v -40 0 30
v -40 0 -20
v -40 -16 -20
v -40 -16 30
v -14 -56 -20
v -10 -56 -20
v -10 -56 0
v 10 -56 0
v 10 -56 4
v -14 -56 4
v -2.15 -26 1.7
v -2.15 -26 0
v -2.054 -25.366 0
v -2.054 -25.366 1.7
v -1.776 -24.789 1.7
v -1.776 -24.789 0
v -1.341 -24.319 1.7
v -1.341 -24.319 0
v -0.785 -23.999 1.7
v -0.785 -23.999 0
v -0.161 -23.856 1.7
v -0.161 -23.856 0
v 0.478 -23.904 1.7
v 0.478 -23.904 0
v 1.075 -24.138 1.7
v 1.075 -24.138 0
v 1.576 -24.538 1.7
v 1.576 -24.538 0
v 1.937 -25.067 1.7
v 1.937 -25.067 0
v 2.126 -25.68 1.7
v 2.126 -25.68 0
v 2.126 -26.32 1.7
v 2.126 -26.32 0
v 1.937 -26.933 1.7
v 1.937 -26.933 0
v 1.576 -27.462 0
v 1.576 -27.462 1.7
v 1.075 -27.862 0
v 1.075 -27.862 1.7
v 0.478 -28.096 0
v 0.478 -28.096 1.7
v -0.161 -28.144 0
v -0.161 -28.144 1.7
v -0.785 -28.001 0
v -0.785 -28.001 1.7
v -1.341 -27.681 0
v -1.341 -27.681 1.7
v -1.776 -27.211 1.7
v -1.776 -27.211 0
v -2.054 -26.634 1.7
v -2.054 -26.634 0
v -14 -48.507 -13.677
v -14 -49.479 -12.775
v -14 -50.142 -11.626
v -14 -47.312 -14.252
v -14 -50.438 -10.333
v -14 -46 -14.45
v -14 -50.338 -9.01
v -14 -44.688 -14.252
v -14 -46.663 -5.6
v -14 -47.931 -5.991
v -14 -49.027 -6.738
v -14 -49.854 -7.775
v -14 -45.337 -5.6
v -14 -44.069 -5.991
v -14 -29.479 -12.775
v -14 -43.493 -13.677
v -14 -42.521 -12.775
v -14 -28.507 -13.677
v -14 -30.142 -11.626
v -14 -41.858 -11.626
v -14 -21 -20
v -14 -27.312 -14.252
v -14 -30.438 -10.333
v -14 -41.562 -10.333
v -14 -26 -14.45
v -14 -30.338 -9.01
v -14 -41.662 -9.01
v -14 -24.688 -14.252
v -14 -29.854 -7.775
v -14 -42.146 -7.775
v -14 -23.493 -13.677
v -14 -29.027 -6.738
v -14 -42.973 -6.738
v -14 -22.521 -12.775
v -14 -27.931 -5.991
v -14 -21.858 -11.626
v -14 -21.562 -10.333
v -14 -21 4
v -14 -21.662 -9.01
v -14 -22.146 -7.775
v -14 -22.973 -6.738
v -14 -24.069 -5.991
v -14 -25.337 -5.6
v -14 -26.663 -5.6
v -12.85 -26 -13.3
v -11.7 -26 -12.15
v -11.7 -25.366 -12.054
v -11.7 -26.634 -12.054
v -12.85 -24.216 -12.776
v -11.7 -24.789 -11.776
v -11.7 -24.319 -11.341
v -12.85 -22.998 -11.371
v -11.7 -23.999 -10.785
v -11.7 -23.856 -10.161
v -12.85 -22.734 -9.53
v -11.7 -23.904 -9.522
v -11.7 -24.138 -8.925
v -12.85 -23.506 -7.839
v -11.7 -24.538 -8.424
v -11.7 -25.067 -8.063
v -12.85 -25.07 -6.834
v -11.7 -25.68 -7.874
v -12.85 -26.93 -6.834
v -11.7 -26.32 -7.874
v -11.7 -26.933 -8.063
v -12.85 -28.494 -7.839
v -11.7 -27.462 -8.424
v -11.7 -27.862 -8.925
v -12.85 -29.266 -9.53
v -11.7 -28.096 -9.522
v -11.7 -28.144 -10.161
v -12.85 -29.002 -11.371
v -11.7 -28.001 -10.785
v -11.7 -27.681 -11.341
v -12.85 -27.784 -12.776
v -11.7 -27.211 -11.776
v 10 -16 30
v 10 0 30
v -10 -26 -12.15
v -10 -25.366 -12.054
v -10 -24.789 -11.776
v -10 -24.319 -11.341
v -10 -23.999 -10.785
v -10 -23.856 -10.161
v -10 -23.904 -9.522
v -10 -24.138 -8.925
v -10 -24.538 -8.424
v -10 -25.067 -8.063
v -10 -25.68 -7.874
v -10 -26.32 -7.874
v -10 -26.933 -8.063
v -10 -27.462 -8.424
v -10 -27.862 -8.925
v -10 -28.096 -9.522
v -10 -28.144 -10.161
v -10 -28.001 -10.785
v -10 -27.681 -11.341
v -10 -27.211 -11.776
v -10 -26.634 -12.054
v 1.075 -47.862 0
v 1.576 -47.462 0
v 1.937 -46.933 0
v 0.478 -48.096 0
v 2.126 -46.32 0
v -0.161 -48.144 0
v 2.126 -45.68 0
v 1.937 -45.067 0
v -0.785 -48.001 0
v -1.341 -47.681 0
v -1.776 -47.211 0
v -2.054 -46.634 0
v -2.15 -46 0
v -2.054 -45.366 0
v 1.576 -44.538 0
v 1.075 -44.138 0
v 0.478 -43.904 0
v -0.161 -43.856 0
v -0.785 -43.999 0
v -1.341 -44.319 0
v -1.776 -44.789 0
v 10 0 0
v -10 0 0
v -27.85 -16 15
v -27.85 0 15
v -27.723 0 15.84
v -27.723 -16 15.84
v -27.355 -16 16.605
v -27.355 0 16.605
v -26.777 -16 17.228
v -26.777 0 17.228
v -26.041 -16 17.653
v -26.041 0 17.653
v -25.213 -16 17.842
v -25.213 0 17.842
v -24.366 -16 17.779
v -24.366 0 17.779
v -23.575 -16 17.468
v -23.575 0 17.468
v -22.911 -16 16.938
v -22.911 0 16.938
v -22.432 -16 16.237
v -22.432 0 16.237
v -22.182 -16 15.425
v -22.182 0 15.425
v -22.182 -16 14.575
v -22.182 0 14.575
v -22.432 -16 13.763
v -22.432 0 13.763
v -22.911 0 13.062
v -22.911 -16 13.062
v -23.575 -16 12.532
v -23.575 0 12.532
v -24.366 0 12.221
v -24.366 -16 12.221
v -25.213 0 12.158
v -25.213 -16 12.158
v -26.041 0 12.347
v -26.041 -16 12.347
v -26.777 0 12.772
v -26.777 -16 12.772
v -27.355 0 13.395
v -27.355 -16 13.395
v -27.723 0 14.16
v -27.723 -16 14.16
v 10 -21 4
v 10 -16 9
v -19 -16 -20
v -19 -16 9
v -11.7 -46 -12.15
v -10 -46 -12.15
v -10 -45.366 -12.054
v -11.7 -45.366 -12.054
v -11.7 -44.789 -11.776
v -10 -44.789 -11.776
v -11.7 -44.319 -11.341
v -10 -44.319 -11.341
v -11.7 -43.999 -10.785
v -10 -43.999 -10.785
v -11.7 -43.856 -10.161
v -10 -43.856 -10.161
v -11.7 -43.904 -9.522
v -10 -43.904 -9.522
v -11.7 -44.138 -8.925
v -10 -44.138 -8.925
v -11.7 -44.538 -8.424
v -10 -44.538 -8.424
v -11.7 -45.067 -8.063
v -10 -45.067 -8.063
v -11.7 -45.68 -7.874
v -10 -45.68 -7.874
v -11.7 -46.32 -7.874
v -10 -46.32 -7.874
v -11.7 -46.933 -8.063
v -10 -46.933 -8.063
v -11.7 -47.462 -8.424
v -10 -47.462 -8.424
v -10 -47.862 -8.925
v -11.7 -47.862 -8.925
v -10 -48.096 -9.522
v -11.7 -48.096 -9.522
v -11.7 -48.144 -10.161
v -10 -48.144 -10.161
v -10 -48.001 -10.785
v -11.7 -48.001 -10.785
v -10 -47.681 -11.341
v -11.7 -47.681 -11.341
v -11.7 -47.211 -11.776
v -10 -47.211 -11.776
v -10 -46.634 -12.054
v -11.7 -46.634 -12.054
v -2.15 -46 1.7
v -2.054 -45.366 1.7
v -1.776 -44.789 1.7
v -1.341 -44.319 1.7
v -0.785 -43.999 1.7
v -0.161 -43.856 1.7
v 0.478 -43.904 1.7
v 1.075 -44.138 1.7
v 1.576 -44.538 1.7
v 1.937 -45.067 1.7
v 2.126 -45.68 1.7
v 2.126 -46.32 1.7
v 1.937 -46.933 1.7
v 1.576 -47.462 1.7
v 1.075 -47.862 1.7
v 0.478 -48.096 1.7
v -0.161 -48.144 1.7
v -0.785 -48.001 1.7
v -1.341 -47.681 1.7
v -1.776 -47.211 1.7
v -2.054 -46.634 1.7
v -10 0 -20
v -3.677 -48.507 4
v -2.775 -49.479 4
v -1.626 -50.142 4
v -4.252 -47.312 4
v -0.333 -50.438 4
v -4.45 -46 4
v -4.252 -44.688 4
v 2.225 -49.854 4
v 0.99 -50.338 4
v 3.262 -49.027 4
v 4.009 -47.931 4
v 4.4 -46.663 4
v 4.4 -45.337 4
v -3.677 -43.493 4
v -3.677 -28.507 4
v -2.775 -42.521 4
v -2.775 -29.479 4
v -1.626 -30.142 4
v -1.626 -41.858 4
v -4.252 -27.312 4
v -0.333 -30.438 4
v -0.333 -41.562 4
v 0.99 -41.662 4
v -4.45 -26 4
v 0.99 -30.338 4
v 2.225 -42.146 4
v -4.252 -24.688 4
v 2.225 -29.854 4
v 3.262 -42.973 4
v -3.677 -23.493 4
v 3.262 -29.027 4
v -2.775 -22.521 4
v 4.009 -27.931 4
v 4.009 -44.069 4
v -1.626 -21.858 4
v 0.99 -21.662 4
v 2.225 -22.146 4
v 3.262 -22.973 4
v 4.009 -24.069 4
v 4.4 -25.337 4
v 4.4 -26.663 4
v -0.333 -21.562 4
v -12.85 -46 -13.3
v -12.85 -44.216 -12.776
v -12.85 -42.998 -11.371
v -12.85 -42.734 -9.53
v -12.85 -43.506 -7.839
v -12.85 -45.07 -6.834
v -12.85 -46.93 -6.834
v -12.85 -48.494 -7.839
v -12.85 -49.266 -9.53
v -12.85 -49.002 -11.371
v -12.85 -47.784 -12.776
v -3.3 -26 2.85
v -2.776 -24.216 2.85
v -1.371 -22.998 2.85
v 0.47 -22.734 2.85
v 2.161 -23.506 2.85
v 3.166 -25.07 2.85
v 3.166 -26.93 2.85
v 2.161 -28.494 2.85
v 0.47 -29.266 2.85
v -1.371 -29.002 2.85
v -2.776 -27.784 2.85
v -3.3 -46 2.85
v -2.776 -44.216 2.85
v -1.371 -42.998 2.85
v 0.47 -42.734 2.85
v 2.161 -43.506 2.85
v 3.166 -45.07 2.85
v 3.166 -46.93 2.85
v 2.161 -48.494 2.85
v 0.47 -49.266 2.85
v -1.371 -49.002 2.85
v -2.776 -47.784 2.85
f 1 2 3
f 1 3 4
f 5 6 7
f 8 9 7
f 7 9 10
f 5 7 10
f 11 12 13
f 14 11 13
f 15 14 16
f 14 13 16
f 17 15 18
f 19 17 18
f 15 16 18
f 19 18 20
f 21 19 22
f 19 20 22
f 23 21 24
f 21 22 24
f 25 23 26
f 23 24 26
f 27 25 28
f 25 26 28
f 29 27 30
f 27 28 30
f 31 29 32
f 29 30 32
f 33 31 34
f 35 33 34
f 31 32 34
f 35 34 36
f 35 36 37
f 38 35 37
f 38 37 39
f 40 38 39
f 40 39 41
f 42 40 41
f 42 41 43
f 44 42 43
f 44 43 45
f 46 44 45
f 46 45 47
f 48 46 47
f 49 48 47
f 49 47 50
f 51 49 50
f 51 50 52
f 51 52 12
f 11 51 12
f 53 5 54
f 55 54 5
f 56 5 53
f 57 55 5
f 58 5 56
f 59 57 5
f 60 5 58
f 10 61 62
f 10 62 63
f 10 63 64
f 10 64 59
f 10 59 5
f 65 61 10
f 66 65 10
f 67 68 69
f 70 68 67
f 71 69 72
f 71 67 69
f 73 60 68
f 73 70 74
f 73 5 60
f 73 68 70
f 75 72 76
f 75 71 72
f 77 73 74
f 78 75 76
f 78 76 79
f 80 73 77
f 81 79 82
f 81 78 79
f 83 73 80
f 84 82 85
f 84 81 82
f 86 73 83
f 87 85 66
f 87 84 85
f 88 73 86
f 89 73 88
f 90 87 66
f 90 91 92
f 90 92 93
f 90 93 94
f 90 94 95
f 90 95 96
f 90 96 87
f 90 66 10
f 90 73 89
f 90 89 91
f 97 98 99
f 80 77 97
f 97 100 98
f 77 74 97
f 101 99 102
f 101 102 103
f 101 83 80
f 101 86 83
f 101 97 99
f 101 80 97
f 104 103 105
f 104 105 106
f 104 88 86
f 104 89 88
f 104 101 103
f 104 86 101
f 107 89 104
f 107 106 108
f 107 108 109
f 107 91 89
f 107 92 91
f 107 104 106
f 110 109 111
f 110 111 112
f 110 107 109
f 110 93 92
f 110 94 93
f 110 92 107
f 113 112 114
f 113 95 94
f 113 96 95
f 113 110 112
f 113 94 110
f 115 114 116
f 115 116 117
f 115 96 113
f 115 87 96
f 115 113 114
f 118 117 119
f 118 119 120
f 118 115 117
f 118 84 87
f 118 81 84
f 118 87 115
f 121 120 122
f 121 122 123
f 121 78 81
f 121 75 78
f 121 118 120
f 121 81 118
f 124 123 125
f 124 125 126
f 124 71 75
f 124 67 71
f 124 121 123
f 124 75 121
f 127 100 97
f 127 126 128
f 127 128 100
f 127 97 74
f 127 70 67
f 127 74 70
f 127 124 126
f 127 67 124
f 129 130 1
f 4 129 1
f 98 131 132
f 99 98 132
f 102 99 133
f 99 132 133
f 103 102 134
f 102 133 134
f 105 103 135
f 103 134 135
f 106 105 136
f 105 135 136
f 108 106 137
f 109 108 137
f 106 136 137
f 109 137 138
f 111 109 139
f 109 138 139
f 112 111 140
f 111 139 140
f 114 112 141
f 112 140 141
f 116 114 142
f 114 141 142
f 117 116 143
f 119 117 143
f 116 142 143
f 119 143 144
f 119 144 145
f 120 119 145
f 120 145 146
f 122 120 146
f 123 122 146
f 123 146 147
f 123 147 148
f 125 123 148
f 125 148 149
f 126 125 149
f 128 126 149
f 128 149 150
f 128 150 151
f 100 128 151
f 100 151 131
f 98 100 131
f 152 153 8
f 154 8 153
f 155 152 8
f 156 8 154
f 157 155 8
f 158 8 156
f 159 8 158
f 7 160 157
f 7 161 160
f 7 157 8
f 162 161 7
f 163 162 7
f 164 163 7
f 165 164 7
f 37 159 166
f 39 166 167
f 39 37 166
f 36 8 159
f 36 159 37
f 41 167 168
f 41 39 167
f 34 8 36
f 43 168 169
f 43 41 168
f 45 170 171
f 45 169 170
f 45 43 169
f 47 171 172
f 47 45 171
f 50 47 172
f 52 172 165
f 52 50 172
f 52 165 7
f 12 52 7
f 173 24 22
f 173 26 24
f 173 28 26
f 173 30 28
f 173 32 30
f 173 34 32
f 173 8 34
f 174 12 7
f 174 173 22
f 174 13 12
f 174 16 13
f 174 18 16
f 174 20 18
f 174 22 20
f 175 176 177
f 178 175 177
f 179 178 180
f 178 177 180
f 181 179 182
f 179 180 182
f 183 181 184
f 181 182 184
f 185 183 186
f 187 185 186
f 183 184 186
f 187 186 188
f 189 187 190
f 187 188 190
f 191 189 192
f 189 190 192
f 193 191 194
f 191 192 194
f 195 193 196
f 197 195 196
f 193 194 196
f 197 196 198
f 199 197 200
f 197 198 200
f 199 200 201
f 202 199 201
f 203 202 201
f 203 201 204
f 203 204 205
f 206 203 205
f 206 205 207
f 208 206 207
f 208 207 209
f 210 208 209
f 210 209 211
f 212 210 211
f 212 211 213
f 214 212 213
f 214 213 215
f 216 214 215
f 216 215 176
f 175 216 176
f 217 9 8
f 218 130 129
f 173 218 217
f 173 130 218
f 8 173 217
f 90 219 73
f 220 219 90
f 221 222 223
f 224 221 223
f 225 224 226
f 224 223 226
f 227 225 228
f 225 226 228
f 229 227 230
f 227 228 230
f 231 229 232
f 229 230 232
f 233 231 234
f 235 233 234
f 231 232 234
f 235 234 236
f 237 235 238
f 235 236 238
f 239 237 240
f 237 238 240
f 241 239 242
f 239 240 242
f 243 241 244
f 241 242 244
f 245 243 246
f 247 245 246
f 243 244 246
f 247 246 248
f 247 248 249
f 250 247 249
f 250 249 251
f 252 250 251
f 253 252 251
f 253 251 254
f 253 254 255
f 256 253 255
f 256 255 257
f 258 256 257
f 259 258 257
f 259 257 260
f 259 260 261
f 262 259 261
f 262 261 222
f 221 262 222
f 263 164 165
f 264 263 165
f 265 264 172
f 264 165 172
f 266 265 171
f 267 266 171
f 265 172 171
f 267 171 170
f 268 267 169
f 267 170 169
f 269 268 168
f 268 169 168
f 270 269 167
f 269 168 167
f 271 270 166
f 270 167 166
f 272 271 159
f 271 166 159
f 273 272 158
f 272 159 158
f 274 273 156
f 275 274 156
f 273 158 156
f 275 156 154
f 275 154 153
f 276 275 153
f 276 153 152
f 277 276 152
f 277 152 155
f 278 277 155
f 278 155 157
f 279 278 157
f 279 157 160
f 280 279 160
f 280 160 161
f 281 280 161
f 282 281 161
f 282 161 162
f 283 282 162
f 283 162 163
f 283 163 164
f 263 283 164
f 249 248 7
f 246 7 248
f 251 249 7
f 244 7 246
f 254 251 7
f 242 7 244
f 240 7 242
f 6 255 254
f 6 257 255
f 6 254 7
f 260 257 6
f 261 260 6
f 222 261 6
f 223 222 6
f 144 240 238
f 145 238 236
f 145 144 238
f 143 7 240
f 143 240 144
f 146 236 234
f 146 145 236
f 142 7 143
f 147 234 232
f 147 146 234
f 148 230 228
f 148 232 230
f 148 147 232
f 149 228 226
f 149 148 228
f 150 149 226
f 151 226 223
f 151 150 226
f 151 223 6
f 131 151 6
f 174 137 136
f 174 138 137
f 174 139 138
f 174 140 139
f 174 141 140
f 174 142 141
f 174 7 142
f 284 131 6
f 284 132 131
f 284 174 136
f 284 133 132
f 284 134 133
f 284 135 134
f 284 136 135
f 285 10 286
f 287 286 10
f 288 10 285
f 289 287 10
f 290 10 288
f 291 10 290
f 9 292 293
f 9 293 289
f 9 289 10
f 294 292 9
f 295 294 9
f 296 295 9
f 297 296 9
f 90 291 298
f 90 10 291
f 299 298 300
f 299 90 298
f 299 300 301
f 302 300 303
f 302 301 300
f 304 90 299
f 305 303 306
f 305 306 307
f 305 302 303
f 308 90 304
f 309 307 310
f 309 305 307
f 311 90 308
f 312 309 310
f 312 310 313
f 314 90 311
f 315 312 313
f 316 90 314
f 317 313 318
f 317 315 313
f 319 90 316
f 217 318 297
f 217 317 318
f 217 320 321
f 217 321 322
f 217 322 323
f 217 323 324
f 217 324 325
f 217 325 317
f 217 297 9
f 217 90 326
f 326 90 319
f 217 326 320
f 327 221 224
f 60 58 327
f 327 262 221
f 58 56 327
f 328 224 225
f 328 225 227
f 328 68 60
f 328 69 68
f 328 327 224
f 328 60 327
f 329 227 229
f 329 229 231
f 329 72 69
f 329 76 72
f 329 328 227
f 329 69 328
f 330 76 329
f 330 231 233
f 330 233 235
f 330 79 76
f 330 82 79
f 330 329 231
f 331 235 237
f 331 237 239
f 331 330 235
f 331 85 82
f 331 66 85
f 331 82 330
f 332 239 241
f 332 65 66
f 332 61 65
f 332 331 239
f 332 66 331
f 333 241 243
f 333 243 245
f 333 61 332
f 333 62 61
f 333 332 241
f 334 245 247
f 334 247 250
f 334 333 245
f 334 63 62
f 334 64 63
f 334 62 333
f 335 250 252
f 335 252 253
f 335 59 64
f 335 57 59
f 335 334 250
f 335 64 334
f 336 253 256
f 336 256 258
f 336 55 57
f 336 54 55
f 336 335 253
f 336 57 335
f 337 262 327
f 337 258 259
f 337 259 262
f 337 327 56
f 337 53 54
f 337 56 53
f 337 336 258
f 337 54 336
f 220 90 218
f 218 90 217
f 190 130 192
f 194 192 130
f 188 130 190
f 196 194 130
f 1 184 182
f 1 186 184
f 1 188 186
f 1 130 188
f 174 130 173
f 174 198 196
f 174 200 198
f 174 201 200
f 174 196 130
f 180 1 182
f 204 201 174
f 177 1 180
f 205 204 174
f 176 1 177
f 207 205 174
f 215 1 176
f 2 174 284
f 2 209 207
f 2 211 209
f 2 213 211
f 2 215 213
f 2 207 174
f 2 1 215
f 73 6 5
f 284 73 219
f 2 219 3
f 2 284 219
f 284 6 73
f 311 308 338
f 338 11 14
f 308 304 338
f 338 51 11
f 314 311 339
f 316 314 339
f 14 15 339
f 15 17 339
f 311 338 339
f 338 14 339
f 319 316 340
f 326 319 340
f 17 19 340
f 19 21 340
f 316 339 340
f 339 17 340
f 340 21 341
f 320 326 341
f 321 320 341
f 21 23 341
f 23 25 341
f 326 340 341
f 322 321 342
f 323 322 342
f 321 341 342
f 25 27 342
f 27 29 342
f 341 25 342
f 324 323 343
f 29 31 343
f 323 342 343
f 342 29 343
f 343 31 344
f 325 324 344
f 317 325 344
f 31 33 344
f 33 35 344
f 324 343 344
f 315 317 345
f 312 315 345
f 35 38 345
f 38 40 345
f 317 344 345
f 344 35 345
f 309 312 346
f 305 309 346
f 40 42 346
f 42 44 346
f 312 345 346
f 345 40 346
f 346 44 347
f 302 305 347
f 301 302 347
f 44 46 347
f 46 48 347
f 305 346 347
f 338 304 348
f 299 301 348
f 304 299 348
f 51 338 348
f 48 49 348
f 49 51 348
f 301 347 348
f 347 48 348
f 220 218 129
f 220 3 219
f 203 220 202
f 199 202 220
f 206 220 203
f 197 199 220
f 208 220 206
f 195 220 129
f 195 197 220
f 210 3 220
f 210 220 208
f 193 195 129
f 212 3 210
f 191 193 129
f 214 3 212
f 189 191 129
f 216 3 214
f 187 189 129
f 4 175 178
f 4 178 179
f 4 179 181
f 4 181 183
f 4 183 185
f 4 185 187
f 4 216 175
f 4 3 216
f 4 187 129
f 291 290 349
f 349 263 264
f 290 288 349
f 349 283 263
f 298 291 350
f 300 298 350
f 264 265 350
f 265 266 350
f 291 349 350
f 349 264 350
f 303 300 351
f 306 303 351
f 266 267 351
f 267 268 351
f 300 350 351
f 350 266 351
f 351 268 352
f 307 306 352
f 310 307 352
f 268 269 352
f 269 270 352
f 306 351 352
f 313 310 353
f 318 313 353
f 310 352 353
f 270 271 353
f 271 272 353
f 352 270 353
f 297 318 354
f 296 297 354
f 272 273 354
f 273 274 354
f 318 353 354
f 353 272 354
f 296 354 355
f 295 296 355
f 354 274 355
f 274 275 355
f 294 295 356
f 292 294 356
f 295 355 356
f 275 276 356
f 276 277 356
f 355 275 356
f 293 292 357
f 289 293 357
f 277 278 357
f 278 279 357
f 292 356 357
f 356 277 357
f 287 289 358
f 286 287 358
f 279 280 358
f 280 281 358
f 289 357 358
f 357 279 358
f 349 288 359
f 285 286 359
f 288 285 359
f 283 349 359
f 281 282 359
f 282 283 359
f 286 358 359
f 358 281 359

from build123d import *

# Parameters (mm, degrees)
BOSS_EXTRUDE1_DEPTH = 30
BOSS_EXTRUDE2_DEPTH = 30
SKETCH3_R           = 2.85
CUT_EXTRUDE1_DEPTH  = 67
SKETCH4_R           = 2.85
CUT_EXTRUDE2_DEPTH  = 67.627240093
SKETCH5_R           = 2.85
CUT_EXTRUDE3_DEPTH  = 67.462848717
BOSS_EXTRUDE3_DEPTH = 40
SKETCH7_R           = 2.15
CUT_EXTRUDE4_DEPTH  = 86.064681273
SKETCH8_R           = 2.15
CUT_EXTRUDE5_DEPTH  = 91.19977827
CHAMFER1_SIZE       = 2.3
CHAMFER2_SIZE       = 5
SKETCH9_W           = 30
SKETCH9_H           = 30
CUT_EXTRUDE6_DEPTH  = 76.498344353


with BuildPart() as part:
    # Sketch1 → Boss-Extrude1 (new body)
    with BuildSketch(Plane.XY):
        Polygon((10, 0), (40, -5.357142857), (38.099489796, -16), (-40, -16), (-40, 0), align=None)
    extrude(amount=BOSS_EXTRUDE1_DEPTH)

    # Sketch2 → Boss-Extrude2 (add)
    with BuildSketch(Plane.ZY.offset(40)):
        Polygon((0, 0), (-20, 0), (-50, -5.357142857), (-48.099489796, -16), (0, -16), align=None)
    extrude(amount=-BOSS_EXTRUDE2_DEPTH)

    # Sketch3 → Cut-Extrude1 (cut, through all)
    with BuildSketch(Plane(origin=(0, 0, 0), x_dir=(1, 0, 0), z_dir=(0, 1, 0))):
        with Locations(Location((-25, -15, 0), (0, 0, 180))):
            Circle(SKETCH3_R)
    extrude(amount=-CUT_EXTRUDE1_DEPTH, mode=Mode.SUBTRACT)

    # Sketch4 → Cut-Extrude2 (cut, through all)
    with BuildSketch(Plane(origin=(0.309023486, 1.73053152, 0), x_dir=(0.9844275755084806, -0.17579063848366547, 0), z_dir=(0.17579063848366547, 0.9844275755084806, 0))):
        with Locations(Location((25.081557169, -15, 0), (0, 0, 180))):
            Circle(SKETCH4_R)
    extrude(amount=-CUT_EXTRUDE2_DEPTH, mode=Mode.SUBTRACT)

    # Sketch5 → Cut-Extrude3 (cut, through all)
    with BuildSketch(Plane(origin=(0, 3.461063041, -0.618046972), x_dir=(1, 0, 0), z_dir=(0, 0.9844275755084821, -0.1757906384836575))):
        with Locations(Location((-25, 34.925832924, 0), (0, 0, 270))):
            Circle(SKETCH5_R)
    extrude(amount=-CUT_EXTRUDE3_DEPTH, mode=Mode.SUBTRACT)

    # Sketch6 → Boss-Extrude3 (add)
    with BuildSketch(Plane.XZ.offset(16)):
        Polygon((-10, 0), (-10, -20), (-14, -20), (-14, 4), (10, 4), (10, 0), align=None)
    extrude(amount=BOSS_EXTRUDE3_DEPTH)

    # Sketch7 → Cut-Extrude4 (cut, through all)
    with BuildSketch(Plane(origin=(0, 0, 0), x_dir=(-1, 0, 0), z_dir=(0, 0, -1))):
        with Locations((0, -46)):
            Circle(SKETCH7_R)
        with Locations((0, -26)):
            Circle(SKETCH7_R)
    extrude(amount=-CUT_EXTRUDE4_DEPTH, mode=Mode.SUBTRACT)

    # Sketch8 → Cut-Extrude5 (cut, through all)
    with BuildSketch(Plane(origin=(-10, 0, 0), x_dir=(0, 0, -1), z_dir=(1, 0, 0))):
        with Locations((10, -46)):
            Circle(SKETCH8_R)
        with Locations((10, -26)):
            Circle(SKETCH8_R)
    extrude(amount=-CUT_EXTRUDE5_DEPTH, mode=Mode.SUBTRACT)

    # Chamfer1
    chamfer1_edges = [part.edges().sort_by_distance(p)[0] for p in [
        (2.15, -46, 4),
        (2.15, -26, 4),
        (-14, -46, -7.85),
        (-14, -26, -7.85),
    ]]
    chamfer(chamfer1_edges, length=CHAMFER1_SIZE)

    # Chamfer2
    chamfer2_edges = [part.edges().sort_by_distance(p)[0] for p in [
        (-2, -16, 4),
        (-14, -16, -8),
    ]]
    chamfer(chamfer2_edges, length=CHAMFER2_SIZE)

    # Sketch9 → Cut-Extrude6 (cut, through all)
    with BuildSketch(Plane.XZ.offset(16)):
        with Locations((25, 15)):
            Rectangle(SKETCH9_W, SKETCH9_H)
        with Locations((-25, -35)):
            Rectangle(SKETCH9_W, SKETCH9_H)
    extrude(amount=-CUT_EXTRUDE6_DEPTH, mode=Mode.SUBTRACT)


solid = part.part
